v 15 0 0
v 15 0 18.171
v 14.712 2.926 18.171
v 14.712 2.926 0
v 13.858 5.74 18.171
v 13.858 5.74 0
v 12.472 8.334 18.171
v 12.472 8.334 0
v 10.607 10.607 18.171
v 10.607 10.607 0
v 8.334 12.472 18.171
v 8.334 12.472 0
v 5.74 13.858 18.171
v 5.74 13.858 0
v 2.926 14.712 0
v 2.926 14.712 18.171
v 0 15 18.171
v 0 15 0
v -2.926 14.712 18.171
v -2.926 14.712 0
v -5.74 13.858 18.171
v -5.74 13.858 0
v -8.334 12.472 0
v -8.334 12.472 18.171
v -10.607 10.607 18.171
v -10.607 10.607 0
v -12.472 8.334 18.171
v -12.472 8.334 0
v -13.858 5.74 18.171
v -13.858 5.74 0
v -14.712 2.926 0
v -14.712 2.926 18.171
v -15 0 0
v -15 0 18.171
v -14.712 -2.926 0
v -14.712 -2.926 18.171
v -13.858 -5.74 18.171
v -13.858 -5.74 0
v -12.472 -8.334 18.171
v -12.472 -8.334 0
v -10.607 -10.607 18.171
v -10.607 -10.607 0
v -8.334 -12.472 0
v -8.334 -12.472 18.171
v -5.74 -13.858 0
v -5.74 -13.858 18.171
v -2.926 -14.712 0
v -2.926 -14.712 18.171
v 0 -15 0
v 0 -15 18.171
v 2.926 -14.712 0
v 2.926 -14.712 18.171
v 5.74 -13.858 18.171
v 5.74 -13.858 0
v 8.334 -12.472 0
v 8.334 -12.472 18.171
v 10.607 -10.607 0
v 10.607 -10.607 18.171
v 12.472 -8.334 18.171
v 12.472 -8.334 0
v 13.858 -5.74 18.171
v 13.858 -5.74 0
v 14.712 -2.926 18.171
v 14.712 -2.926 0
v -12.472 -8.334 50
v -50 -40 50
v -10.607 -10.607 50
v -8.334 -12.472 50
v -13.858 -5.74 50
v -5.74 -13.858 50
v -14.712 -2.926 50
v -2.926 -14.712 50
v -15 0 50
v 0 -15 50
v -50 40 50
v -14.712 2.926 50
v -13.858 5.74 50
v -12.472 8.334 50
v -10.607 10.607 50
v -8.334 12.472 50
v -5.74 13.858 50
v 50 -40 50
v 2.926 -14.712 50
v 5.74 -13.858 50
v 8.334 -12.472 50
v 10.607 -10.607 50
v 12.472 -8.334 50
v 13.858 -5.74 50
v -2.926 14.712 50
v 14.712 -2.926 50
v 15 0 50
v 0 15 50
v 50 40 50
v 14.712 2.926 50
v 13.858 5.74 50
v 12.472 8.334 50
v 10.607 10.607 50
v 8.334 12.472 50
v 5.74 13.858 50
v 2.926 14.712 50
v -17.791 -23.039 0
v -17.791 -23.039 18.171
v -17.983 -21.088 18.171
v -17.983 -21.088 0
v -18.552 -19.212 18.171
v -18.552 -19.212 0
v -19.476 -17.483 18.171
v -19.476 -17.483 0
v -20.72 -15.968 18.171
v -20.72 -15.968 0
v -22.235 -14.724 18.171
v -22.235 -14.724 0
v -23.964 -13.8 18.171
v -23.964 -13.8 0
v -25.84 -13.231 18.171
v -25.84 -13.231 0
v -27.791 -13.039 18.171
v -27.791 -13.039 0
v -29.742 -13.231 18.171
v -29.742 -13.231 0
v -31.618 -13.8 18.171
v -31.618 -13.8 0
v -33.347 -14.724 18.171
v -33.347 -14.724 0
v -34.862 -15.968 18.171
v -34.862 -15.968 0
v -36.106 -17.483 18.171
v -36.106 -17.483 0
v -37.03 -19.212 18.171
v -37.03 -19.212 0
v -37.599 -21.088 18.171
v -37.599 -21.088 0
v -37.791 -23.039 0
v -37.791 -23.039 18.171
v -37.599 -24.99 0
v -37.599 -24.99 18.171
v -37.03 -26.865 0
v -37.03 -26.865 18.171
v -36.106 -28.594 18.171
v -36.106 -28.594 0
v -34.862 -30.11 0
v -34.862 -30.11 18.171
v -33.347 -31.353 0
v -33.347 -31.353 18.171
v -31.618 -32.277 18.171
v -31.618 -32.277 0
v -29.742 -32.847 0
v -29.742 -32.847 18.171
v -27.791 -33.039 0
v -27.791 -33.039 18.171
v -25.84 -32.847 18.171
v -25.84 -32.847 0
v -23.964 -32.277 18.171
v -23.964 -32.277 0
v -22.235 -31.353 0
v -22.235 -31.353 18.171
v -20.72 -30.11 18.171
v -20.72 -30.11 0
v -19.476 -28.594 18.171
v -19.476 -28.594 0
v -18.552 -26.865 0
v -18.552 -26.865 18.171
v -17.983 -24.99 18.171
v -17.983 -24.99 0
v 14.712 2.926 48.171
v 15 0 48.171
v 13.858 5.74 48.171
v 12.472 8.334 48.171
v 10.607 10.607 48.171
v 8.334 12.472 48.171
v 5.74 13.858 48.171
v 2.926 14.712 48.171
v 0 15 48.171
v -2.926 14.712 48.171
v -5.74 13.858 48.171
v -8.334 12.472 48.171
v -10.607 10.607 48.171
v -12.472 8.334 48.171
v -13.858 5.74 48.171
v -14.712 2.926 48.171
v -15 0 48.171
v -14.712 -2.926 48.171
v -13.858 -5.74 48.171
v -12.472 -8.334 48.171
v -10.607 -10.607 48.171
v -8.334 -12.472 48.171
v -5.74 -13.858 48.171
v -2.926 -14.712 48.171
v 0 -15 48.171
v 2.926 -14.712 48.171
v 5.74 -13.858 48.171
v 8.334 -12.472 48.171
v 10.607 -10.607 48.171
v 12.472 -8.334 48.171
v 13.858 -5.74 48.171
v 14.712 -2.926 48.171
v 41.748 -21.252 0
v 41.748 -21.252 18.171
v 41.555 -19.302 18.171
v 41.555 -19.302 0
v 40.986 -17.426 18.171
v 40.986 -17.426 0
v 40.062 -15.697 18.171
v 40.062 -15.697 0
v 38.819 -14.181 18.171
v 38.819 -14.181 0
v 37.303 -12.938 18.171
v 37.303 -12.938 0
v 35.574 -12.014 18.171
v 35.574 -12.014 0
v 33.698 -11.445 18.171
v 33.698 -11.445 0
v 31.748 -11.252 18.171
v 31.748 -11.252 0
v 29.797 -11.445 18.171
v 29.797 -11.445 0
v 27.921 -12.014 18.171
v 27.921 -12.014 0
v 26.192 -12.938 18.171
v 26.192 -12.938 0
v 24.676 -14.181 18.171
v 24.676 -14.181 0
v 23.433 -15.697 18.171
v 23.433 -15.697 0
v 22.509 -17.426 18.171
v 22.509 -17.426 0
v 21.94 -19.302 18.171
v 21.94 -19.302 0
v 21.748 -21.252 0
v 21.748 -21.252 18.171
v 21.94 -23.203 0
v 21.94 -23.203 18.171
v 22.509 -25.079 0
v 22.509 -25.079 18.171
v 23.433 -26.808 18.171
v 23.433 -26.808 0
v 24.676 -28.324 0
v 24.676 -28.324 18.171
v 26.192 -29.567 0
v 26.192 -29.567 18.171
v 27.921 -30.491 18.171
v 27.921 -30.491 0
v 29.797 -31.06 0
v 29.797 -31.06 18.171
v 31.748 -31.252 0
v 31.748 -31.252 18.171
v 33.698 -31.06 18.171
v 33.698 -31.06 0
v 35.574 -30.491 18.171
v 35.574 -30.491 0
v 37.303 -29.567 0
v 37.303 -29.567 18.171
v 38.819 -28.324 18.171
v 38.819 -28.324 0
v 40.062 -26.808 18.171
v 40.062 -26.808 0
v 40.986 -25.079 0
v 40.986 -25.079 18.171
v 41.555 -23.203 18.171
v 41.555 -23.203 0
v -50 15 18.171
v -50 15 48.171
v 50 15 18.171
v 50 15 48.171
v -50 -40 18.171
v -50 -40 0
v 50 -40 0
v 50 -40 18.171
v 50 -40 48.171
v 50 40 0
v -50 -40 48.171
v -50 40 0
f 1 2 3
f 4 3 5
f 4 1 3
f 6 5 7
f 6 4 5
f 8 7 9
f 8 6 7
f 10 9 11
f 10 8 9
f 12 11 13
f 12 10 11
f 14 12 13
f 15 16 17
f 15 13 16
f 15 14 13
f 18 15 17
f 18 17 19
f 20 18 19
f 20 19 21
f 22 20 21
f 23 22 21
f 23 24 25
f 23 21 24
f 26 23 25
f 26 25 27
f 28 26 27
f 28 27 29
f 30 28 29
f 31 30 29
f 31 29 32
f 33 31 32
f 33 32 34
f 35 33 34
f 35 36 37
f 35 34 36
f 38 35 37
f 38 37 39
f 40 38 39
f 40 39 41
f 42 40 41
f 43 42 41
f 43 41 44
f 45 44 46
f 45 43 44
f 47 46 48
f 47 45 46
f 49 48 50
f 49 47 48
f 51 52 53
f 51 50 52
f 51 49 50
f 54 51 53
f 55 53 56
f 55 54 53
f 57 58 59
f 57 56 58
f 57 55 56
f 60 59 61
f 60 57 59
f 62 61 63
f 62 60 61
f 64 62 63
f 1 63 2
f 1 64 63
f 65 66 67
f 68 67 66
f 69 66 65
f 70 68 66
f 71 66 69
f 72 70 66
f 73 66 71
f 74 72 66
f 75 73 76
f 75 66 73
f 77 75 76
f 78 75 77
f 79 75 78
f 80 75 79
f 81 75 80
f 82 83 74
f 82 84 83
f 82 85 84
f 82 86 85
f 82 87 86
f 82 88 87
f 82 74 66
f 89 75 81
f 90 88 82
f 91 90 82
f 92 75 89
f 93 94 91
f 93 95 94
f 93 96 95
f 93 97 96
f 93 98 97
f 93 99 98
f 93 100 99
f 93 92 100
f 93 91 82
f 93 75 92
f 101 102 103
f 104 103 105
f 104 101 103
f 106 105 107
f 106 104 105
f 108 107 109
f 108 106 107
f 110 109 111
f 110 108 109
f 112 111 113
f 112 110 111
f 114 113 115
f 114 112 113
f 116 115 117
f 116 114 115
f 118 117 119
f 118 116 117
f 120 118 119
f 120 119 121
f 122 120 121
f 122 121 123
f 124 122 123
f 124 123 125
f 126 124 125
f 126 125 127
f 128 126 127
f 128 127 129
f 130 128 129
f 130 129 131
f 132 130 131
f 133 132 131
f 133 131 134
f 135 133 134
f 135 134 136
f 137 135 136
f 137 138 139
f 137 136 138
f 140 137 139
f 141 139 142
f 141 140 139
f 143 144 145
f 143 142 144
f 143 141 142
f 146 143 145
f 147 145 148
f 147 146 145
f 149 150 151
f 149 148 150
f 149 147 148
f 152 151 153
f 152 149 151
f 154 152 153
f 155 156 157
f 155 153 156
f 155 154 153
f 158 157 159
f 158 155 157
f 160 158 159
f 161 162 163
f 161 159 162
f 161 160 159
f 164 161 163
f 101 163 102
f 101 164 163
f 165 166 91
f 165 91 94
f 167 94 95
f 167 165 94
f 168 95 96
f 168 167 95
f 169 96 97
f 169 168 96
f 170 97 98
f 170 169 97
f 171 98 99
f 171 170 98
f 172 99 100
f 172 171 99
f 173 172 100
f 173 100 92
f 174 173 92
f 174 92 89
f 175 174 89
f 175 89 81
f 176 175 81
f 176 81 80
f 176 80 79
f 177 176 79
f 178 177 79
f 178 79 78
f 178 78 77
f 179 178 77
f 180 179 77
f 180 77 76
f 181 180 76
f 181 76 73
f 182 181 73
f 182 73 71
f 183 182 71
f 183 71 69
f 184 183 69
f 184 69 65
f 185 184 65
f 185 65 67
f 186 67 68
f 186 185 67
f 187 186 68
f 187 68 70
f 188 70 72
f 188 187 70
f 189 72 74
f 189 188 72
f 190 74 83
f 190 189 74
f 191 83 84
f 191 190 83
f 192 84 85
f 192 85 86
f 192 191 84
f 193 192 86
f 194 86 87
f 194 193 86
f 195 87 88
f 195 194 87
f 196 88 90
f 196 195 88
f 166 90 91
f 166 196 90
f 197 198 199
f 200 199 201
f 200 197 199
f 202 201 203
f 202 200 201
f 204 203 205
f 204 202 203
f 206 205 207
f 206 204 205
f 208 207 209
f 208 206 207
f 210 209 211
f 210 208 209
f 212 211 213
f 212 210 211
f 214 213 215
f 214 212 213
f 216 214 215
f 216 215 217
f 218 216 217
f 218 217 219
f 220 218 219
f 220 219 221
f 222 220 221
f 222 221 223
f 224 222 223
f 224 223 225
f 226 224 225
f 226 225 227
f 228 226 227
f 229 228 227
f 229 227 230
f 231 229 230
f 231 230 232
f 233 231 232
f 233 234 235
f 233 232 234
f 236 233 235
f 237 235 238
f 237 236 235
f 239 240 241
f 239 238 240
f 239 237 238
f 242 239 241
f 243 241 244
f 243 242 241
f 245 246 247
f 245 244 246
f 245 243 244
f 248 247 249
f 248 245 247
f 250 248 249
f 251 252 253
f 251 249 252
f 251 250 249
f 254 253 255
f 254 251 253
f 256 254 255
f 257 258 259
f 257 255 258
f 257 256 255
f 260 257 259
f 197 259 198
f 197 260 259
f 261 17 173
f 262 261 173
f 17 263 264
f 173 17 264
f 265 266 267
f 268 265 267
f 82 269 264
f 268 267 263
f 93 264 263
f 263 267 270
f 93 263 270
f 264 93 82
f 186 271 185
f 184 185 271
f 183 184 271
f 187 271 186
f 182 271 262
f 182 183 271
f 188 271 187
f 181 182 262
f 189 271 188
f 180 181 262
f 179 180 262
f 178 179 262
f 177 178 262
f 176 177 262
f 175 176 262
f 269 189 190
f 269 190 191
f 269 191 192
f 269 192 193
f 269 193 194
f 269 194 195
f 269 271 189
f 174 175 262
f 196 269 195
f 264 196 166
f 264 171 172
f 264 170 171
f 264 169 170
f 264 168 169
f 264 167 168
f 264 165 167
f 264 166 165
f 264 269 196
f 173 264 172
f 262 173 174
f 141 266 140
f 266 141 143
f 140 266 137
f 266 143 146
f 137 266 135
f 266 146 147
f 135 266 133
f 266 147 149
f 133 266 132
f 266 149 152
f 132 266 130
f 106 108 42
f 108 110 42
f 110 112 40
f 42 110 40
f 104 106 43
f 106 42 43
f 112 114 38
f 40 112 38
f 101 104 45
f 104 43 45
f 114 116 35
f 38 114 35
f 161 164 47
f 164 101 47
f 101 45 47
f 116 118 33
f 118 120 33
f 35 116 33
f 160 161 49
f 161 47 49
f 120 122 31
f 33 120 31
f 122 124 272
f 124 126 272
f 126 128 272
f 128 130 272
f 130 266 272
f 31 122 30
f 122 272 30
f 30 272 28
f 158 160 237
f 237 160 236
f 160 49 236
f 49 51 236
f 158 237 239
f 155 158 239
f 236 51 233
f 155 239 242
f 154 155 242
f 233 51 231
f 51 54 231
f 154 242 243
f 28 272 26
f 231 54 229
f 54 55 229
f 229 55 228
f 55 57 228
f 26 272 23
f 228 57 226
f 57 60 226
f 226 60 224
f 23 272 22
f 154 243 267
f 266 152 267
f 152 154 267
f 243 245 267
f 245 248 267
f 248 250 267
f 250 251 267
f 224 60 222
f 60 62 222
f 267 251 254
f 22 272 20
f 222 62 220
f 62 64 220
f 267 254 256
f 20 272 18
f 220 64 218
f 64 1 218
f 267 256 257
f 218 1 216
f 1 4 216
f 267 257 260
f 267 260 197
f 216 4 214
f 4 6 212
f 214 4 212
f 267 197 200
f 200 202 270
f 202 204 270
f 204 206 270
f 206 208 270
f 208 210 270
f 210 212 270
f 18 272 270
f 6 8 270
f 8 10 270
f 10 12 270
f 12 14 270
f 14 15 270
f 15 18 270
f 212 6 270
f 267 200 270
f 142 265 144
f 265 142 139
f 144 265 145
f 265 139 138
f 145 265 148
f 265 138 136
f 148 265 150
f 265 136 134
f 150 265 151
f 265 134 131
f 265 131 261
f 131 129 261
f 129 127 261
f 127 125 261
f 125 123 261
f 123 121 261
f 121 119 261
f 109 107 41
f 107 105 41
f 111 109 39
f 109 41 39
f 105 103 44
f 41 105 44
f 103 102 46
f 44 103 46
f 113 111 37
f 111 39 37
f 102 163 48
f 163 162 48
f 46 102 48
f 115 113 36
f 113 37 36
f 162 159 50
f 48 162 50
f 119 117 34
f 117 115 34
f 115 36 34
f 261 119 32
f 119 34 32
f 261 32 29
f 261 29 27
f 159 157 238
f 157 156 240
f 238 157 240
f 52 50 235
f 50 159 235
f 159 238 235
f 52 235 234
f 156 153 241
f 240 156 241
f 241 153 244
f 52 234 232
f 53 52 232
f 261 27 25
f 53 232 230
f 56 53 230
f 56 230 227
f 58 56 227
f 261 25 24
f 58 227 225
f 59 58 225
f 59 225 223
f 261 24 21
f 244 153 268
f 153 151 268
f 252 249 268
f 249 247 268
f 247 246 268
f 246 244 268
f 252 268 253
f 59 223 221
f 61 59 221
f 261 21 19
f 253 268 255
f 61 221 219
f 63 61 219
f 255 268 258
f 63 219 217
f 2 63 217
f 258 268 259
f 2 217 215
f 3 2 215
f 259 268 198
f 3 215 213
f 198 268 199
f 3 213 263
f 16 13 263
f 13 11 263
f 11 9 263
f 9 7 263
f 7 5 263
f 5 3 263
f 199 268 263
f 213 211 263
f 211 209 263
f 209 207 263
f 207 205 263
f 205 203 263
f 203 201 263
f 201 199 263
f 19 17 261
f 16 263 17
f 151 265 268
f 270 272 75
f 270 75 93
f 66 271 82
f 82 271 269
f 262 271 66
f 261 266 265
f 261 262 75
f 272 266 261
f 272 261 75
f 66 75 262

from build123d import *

# Parameters (mm, degrees)
F0_W          = 100
F0_H          = 80
F0_R          = 15
F1_DEPTH      = 50
F2_W          = 100
F2_H          = 30
F3_DEPTH      = 50.001
F3_DEPTH_BACK = 105.8
F4_R          = 10
F5_DEPTH      = 23.4


with BuildPart() as f1:
    # F0 (on Top) → F1 (new body)
    with BuildSketch(Plane.XY):
        Rectangle(F0_W, F0_H)
        Circle(F0_R, mode=Mode.SUBTRACT)
    extrude(amount=F1_DEPTH)

    # F2 (on Right) → F3 (cut, two sides)
    with BuildSketch(Plane.YZ) as f3_sk:
        with Locations((-35, 33.171409)):
            Rectangle(F2_W, F2_H)
    extrude(amount=F3_DEPTH, mode=Mode.SUBTRACT)
    extrude(f3_sk.sketch, amount=-F3_DEPTH_BACK, mode=Mode.SUBTRACT)

    # F4 (on Top) → F5 (cut)
    with BuildSketch(Plane.XY):
        with Locations((-27.791176, -23.038651)):
            Circle(F4_R)
        with Locations((31.747535, -21.252491)):
            Circle(F4_R)
    extrude(amount=F5_DEPTH, mode=Mode.SUBTRACT)


solid = f1.part
